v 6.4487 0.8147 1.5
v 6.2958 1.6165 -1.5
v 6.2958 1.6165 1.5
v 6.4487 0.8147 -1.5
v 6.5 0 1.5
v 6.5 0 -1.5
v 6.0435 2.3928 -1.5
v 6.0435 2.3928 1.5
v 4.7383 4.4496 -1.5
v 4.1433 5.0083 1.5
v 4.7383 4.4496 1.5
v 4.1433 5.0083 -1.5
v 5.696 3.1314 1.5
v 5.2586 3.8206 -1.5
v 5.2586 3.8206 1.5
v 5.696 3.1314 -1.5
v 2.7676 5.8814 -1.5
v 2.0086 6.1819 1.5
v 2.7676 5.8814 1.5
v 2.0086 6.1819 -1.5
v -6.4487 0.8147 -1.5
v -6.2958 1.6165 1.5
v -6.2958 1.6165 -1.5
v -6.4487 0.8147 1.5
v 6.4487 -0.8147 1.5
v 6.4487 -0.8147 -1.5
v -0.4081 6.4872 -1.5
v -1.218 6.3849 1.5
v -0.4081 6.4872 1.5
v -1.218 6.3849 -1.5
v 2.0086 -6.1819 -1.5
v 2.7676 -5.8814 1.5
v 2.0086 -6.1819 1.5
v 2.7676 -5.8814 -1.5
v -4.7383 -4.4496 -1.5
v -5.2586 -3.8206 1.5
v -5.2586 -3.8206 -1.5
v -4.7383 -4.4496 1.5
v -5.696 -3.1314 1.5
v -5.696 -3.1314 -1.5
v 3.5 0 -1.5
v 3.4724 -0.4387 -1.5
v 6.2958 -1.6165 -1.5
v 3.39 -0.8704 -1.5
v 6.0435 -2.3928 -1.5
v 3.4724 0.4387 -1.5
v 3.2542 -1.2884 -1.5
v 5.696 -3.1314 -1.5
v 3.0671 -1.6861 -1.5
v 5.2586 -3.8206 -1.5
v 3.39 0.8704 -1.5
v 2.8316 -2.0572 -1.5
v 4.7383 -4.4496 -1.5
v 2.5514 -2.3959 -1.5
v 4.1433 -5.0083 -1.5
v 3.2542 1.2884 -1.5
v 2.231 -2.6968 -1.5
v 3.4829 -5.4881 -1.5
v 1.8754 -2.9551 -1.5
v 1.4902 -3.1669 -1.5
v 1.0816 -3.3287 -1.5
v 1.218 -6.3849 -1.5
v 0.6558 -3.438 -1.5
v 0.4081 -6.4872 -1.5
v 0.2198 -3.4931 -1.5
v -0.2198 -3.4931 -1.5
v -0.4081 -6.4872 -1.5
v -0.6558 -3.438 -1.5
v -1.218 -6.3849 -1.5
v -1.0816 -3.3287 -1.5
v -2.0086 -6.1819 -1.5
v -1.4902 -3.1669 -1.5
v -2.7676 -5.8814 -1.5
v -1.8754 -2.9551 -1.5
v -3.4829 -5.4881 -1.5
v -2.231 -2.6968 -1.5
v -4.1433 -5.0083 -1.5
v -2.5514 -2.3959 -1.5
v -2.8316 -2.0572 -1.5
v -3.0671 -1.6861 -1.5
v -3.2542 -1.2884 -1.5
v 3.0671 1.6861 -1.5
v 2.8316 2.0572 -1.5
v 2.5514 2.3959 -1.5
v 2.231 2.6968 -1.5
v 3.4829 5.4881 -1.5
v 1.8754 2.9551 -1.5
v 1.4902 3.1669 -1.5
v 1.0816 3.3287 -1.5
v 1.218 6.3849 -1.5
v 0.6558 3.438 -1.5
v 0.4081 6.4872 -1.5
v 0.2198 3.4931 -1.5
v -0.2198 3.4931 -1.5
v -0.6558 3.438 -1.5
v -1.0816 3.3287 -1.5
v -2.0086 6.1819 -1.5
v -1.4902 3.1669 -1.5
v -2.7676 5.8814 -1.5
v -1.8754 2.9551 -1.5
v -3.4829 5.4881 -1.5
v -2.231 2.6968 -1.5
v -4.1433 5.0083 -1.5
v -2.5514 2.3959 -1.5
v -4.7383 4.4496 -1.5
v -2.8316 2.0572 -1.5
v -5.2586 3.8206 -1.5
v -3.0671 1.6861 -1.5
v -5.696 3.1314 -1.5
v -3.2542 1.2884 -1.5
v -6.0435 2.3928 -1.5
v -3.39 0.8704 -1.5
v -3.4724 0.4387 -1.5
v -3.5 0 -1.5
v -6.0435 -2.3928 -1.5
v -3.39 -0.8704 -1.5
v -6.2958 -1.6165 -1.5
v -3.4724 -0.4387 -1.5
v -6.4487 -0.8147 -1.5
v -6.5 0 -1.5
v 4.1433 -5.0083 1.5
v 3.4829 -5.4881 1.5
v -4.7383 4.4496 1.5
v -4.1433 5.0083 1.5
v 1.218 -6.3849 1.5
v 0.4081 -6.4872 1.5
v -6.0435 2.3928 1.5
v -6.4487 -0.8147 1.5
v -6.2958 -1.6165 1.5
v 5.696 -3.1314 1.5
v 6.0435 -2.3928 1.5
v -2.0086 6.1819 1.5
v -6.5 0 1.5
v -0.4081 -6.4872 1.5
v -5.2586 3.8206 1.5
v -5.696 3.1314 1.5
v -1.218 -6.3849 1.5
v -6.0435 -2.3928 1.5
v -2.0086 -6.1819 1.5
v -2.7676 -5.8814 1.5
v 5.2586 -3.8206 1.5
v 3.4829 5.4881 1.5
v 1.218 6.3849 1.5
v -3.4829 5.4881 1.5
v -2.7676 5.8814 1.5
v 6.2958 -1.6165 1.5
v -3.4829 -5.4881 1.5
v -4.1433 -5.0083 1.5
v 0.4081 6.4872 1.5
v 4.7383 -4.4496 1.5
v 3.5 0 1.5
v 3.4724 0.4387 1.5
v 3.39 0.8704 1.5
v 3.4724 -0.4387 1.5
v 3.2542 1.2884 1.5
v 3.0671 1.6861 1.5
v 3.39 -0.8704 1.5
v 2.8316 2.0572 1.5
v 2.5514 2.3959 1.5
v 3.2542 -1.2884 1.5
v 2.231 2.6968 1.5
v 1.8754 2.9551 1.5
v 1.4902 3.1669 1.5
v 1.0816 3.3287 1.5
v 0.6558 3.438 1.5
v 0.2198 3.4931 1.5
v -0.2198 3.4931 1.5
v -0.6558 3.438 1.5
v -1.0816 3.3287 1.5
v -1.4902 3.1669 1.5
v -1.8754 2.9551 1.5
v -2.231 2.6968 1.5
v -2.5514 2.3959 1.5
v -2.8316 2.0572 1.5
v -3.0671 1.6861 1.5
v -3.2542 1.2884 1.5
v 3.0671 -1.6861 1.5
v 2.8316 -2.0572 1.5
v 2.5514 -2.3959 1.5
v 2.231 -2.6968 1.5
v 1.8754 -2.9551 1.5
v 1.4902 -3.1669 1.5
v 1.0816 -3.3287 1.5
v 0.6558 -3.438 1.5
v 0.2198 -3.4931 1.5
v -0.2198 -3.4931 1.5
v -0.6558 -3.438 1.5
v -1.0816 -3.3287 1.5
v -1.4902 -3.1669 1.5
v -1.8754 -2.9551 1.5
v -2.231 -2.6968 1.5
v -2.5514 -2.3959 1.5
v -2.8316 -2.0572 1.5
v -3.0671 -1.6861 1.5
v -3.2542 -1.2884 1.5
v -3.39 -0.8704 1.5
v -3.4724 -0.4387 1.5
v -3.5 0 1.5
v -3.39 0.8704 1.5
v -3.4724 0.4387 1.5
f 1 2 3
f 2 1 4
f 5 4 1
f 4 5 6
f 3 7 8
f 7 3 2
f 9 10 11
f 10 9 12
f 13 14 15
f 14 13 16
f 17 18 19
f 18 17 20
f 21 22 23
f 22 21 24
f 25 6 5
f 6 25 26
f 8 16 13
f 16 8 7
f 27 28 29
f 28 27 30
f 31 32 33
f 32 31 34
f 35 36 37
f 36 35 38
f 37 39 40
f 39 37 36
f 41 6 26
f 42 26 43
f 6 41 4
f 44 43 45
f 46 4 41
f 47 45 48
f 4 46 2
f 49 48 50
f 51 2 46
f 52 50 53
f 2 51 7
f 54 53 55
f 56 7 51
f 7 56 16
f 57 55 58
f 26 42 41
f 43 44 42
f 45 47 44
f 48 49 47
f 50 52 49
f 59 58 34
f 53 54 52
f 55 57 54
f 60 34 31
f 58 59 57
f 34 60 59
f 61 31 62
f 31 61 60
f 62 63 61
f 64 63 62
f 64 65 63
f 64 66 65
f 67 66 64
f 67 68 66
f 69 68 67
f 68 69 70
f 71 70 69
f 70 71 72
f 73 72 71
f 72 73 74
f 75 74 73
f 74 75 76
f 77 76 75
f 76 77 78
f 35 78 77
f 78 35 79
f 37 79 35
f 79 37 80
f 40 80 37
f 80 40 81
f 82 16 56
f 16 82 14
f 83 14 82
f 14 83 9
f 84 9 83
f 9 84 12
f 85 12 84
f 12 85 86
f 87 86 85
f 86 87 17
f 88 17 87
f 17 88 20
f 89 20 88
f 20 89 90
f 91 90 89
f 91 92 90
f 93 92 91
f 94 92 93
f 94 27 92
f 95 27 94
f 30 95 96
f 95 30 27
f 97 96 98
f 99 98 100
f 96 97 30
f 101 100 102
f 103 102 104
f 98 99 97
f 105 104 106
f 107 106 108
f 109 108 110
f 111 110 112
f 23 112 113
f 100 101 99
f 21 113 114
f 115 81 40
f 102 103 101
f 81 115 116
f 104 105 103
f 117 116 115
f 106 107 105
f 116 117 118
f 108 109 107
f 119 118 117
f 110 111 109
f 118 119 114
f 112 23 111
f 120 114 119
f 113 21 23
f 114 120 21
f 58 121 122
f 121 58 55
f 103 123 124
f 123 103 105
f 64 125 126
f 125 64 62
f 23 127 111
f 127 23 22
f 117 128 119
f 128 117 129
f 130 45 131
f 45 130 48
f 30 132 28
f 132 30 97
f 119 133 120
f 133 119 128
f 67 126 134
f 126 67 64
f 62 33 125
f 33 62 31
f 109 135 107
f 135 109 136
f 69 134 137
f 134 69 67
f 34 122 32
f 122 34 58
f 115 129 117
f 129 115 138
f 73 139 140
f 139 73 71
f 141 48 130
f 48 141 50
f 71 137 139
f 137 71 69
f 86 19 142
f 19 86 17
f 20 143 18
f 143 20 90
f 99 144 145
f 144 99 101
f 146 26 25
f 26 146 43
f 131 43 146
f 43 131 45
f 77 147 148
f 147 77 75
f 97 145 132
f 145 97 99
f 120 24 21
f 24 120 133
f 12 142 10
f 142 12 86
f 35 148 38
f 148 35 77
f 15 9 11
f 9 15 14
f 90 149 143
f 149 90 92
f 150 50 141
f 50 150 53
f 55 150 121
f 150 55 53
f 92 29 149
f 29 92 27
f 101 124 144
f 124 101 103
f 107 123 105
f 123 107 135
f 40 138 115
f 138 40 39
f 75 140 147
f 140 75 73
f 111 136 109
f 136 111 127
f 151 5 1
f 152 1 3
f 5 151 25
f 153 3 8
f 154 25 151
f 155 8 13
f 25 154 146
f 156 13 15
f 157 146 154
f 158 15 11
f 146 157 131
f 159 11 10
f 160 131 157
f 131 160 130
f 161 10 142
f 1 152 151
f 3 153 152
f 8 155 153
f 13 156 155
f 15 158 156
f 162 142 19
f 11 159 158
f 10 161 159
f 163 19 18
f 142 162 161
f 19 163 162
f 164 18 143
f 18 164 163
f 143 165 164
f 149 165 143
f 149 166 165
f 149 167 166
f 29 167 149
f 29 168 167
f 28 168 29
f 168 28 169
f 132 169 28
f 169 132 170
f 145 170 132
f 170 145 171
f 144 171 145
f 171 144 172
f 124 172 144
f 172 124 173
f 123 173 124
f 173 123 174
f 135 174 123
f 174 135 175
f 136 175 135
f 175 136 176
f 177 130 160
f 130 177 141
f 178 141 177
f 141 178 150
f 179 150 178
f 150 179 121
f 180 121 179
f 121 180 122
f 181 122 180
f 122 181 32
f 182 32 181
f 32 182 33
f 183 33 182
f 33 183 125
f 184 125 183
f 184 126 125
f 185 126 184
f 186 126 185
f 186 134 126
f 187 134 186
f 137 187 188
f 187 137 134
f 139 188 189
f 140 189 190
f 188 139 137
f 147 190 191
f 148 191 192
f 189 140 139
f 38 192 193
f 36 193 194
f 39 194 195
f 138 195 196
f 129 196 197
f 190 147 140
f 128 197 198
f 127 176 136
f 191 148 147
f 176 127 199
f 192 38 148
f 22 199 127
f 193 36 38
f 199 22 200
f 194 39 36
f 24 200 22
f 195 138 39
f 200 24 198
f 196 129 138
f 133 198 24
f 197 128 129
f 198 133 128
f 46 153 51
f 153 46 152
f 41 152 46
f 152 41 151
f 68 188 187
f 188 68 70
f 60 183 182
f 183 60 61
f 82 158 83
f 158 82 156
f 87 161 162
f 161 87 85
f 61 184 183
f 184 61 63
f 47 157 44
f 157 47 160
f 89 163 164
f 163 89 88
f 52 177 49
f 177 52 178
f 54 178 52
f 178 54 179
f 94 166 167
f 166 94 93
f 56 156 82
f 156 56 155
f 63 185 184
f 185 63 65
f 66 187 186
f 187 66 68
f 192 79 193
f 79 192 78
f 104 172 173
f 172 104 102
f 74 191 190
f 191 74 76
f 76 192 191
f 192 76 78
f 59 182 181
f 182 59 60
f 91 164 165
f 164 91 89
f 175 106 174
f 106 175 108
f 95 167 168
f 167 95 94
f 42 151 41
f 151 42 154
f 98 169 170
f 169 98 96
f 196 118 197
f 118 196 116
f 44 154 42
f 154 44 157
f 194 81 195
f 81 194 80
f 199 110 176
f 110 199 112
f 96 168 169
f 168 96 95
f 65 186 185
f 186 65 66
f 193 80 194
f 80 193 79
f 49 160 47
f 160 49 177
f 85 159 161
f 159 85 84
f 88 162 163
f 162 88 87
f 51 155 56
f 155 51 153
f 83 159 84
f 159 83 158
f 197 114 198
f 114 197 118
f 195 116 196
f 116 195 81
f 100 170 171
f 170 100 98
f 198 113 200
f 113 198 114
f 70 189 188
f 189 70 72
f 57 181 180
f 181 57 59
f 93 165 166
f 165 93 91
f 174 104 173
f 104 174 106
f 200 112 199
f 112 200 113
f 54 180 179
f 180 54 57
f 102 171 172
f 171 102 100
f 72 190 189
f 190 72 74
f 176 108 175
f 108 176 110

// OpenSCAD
$fn = 50;


difference() {
	union() {
		translate(v = [0, 0, -1.5000000000]) {
			cylinder(h = 3, r = 6.5000000000);
		}
	}
	union() {
		translate(v = [0, 0, -100.0000000000]) {
			cylinder(h = 200, r = 3.5000000000);
		}
	}
}
